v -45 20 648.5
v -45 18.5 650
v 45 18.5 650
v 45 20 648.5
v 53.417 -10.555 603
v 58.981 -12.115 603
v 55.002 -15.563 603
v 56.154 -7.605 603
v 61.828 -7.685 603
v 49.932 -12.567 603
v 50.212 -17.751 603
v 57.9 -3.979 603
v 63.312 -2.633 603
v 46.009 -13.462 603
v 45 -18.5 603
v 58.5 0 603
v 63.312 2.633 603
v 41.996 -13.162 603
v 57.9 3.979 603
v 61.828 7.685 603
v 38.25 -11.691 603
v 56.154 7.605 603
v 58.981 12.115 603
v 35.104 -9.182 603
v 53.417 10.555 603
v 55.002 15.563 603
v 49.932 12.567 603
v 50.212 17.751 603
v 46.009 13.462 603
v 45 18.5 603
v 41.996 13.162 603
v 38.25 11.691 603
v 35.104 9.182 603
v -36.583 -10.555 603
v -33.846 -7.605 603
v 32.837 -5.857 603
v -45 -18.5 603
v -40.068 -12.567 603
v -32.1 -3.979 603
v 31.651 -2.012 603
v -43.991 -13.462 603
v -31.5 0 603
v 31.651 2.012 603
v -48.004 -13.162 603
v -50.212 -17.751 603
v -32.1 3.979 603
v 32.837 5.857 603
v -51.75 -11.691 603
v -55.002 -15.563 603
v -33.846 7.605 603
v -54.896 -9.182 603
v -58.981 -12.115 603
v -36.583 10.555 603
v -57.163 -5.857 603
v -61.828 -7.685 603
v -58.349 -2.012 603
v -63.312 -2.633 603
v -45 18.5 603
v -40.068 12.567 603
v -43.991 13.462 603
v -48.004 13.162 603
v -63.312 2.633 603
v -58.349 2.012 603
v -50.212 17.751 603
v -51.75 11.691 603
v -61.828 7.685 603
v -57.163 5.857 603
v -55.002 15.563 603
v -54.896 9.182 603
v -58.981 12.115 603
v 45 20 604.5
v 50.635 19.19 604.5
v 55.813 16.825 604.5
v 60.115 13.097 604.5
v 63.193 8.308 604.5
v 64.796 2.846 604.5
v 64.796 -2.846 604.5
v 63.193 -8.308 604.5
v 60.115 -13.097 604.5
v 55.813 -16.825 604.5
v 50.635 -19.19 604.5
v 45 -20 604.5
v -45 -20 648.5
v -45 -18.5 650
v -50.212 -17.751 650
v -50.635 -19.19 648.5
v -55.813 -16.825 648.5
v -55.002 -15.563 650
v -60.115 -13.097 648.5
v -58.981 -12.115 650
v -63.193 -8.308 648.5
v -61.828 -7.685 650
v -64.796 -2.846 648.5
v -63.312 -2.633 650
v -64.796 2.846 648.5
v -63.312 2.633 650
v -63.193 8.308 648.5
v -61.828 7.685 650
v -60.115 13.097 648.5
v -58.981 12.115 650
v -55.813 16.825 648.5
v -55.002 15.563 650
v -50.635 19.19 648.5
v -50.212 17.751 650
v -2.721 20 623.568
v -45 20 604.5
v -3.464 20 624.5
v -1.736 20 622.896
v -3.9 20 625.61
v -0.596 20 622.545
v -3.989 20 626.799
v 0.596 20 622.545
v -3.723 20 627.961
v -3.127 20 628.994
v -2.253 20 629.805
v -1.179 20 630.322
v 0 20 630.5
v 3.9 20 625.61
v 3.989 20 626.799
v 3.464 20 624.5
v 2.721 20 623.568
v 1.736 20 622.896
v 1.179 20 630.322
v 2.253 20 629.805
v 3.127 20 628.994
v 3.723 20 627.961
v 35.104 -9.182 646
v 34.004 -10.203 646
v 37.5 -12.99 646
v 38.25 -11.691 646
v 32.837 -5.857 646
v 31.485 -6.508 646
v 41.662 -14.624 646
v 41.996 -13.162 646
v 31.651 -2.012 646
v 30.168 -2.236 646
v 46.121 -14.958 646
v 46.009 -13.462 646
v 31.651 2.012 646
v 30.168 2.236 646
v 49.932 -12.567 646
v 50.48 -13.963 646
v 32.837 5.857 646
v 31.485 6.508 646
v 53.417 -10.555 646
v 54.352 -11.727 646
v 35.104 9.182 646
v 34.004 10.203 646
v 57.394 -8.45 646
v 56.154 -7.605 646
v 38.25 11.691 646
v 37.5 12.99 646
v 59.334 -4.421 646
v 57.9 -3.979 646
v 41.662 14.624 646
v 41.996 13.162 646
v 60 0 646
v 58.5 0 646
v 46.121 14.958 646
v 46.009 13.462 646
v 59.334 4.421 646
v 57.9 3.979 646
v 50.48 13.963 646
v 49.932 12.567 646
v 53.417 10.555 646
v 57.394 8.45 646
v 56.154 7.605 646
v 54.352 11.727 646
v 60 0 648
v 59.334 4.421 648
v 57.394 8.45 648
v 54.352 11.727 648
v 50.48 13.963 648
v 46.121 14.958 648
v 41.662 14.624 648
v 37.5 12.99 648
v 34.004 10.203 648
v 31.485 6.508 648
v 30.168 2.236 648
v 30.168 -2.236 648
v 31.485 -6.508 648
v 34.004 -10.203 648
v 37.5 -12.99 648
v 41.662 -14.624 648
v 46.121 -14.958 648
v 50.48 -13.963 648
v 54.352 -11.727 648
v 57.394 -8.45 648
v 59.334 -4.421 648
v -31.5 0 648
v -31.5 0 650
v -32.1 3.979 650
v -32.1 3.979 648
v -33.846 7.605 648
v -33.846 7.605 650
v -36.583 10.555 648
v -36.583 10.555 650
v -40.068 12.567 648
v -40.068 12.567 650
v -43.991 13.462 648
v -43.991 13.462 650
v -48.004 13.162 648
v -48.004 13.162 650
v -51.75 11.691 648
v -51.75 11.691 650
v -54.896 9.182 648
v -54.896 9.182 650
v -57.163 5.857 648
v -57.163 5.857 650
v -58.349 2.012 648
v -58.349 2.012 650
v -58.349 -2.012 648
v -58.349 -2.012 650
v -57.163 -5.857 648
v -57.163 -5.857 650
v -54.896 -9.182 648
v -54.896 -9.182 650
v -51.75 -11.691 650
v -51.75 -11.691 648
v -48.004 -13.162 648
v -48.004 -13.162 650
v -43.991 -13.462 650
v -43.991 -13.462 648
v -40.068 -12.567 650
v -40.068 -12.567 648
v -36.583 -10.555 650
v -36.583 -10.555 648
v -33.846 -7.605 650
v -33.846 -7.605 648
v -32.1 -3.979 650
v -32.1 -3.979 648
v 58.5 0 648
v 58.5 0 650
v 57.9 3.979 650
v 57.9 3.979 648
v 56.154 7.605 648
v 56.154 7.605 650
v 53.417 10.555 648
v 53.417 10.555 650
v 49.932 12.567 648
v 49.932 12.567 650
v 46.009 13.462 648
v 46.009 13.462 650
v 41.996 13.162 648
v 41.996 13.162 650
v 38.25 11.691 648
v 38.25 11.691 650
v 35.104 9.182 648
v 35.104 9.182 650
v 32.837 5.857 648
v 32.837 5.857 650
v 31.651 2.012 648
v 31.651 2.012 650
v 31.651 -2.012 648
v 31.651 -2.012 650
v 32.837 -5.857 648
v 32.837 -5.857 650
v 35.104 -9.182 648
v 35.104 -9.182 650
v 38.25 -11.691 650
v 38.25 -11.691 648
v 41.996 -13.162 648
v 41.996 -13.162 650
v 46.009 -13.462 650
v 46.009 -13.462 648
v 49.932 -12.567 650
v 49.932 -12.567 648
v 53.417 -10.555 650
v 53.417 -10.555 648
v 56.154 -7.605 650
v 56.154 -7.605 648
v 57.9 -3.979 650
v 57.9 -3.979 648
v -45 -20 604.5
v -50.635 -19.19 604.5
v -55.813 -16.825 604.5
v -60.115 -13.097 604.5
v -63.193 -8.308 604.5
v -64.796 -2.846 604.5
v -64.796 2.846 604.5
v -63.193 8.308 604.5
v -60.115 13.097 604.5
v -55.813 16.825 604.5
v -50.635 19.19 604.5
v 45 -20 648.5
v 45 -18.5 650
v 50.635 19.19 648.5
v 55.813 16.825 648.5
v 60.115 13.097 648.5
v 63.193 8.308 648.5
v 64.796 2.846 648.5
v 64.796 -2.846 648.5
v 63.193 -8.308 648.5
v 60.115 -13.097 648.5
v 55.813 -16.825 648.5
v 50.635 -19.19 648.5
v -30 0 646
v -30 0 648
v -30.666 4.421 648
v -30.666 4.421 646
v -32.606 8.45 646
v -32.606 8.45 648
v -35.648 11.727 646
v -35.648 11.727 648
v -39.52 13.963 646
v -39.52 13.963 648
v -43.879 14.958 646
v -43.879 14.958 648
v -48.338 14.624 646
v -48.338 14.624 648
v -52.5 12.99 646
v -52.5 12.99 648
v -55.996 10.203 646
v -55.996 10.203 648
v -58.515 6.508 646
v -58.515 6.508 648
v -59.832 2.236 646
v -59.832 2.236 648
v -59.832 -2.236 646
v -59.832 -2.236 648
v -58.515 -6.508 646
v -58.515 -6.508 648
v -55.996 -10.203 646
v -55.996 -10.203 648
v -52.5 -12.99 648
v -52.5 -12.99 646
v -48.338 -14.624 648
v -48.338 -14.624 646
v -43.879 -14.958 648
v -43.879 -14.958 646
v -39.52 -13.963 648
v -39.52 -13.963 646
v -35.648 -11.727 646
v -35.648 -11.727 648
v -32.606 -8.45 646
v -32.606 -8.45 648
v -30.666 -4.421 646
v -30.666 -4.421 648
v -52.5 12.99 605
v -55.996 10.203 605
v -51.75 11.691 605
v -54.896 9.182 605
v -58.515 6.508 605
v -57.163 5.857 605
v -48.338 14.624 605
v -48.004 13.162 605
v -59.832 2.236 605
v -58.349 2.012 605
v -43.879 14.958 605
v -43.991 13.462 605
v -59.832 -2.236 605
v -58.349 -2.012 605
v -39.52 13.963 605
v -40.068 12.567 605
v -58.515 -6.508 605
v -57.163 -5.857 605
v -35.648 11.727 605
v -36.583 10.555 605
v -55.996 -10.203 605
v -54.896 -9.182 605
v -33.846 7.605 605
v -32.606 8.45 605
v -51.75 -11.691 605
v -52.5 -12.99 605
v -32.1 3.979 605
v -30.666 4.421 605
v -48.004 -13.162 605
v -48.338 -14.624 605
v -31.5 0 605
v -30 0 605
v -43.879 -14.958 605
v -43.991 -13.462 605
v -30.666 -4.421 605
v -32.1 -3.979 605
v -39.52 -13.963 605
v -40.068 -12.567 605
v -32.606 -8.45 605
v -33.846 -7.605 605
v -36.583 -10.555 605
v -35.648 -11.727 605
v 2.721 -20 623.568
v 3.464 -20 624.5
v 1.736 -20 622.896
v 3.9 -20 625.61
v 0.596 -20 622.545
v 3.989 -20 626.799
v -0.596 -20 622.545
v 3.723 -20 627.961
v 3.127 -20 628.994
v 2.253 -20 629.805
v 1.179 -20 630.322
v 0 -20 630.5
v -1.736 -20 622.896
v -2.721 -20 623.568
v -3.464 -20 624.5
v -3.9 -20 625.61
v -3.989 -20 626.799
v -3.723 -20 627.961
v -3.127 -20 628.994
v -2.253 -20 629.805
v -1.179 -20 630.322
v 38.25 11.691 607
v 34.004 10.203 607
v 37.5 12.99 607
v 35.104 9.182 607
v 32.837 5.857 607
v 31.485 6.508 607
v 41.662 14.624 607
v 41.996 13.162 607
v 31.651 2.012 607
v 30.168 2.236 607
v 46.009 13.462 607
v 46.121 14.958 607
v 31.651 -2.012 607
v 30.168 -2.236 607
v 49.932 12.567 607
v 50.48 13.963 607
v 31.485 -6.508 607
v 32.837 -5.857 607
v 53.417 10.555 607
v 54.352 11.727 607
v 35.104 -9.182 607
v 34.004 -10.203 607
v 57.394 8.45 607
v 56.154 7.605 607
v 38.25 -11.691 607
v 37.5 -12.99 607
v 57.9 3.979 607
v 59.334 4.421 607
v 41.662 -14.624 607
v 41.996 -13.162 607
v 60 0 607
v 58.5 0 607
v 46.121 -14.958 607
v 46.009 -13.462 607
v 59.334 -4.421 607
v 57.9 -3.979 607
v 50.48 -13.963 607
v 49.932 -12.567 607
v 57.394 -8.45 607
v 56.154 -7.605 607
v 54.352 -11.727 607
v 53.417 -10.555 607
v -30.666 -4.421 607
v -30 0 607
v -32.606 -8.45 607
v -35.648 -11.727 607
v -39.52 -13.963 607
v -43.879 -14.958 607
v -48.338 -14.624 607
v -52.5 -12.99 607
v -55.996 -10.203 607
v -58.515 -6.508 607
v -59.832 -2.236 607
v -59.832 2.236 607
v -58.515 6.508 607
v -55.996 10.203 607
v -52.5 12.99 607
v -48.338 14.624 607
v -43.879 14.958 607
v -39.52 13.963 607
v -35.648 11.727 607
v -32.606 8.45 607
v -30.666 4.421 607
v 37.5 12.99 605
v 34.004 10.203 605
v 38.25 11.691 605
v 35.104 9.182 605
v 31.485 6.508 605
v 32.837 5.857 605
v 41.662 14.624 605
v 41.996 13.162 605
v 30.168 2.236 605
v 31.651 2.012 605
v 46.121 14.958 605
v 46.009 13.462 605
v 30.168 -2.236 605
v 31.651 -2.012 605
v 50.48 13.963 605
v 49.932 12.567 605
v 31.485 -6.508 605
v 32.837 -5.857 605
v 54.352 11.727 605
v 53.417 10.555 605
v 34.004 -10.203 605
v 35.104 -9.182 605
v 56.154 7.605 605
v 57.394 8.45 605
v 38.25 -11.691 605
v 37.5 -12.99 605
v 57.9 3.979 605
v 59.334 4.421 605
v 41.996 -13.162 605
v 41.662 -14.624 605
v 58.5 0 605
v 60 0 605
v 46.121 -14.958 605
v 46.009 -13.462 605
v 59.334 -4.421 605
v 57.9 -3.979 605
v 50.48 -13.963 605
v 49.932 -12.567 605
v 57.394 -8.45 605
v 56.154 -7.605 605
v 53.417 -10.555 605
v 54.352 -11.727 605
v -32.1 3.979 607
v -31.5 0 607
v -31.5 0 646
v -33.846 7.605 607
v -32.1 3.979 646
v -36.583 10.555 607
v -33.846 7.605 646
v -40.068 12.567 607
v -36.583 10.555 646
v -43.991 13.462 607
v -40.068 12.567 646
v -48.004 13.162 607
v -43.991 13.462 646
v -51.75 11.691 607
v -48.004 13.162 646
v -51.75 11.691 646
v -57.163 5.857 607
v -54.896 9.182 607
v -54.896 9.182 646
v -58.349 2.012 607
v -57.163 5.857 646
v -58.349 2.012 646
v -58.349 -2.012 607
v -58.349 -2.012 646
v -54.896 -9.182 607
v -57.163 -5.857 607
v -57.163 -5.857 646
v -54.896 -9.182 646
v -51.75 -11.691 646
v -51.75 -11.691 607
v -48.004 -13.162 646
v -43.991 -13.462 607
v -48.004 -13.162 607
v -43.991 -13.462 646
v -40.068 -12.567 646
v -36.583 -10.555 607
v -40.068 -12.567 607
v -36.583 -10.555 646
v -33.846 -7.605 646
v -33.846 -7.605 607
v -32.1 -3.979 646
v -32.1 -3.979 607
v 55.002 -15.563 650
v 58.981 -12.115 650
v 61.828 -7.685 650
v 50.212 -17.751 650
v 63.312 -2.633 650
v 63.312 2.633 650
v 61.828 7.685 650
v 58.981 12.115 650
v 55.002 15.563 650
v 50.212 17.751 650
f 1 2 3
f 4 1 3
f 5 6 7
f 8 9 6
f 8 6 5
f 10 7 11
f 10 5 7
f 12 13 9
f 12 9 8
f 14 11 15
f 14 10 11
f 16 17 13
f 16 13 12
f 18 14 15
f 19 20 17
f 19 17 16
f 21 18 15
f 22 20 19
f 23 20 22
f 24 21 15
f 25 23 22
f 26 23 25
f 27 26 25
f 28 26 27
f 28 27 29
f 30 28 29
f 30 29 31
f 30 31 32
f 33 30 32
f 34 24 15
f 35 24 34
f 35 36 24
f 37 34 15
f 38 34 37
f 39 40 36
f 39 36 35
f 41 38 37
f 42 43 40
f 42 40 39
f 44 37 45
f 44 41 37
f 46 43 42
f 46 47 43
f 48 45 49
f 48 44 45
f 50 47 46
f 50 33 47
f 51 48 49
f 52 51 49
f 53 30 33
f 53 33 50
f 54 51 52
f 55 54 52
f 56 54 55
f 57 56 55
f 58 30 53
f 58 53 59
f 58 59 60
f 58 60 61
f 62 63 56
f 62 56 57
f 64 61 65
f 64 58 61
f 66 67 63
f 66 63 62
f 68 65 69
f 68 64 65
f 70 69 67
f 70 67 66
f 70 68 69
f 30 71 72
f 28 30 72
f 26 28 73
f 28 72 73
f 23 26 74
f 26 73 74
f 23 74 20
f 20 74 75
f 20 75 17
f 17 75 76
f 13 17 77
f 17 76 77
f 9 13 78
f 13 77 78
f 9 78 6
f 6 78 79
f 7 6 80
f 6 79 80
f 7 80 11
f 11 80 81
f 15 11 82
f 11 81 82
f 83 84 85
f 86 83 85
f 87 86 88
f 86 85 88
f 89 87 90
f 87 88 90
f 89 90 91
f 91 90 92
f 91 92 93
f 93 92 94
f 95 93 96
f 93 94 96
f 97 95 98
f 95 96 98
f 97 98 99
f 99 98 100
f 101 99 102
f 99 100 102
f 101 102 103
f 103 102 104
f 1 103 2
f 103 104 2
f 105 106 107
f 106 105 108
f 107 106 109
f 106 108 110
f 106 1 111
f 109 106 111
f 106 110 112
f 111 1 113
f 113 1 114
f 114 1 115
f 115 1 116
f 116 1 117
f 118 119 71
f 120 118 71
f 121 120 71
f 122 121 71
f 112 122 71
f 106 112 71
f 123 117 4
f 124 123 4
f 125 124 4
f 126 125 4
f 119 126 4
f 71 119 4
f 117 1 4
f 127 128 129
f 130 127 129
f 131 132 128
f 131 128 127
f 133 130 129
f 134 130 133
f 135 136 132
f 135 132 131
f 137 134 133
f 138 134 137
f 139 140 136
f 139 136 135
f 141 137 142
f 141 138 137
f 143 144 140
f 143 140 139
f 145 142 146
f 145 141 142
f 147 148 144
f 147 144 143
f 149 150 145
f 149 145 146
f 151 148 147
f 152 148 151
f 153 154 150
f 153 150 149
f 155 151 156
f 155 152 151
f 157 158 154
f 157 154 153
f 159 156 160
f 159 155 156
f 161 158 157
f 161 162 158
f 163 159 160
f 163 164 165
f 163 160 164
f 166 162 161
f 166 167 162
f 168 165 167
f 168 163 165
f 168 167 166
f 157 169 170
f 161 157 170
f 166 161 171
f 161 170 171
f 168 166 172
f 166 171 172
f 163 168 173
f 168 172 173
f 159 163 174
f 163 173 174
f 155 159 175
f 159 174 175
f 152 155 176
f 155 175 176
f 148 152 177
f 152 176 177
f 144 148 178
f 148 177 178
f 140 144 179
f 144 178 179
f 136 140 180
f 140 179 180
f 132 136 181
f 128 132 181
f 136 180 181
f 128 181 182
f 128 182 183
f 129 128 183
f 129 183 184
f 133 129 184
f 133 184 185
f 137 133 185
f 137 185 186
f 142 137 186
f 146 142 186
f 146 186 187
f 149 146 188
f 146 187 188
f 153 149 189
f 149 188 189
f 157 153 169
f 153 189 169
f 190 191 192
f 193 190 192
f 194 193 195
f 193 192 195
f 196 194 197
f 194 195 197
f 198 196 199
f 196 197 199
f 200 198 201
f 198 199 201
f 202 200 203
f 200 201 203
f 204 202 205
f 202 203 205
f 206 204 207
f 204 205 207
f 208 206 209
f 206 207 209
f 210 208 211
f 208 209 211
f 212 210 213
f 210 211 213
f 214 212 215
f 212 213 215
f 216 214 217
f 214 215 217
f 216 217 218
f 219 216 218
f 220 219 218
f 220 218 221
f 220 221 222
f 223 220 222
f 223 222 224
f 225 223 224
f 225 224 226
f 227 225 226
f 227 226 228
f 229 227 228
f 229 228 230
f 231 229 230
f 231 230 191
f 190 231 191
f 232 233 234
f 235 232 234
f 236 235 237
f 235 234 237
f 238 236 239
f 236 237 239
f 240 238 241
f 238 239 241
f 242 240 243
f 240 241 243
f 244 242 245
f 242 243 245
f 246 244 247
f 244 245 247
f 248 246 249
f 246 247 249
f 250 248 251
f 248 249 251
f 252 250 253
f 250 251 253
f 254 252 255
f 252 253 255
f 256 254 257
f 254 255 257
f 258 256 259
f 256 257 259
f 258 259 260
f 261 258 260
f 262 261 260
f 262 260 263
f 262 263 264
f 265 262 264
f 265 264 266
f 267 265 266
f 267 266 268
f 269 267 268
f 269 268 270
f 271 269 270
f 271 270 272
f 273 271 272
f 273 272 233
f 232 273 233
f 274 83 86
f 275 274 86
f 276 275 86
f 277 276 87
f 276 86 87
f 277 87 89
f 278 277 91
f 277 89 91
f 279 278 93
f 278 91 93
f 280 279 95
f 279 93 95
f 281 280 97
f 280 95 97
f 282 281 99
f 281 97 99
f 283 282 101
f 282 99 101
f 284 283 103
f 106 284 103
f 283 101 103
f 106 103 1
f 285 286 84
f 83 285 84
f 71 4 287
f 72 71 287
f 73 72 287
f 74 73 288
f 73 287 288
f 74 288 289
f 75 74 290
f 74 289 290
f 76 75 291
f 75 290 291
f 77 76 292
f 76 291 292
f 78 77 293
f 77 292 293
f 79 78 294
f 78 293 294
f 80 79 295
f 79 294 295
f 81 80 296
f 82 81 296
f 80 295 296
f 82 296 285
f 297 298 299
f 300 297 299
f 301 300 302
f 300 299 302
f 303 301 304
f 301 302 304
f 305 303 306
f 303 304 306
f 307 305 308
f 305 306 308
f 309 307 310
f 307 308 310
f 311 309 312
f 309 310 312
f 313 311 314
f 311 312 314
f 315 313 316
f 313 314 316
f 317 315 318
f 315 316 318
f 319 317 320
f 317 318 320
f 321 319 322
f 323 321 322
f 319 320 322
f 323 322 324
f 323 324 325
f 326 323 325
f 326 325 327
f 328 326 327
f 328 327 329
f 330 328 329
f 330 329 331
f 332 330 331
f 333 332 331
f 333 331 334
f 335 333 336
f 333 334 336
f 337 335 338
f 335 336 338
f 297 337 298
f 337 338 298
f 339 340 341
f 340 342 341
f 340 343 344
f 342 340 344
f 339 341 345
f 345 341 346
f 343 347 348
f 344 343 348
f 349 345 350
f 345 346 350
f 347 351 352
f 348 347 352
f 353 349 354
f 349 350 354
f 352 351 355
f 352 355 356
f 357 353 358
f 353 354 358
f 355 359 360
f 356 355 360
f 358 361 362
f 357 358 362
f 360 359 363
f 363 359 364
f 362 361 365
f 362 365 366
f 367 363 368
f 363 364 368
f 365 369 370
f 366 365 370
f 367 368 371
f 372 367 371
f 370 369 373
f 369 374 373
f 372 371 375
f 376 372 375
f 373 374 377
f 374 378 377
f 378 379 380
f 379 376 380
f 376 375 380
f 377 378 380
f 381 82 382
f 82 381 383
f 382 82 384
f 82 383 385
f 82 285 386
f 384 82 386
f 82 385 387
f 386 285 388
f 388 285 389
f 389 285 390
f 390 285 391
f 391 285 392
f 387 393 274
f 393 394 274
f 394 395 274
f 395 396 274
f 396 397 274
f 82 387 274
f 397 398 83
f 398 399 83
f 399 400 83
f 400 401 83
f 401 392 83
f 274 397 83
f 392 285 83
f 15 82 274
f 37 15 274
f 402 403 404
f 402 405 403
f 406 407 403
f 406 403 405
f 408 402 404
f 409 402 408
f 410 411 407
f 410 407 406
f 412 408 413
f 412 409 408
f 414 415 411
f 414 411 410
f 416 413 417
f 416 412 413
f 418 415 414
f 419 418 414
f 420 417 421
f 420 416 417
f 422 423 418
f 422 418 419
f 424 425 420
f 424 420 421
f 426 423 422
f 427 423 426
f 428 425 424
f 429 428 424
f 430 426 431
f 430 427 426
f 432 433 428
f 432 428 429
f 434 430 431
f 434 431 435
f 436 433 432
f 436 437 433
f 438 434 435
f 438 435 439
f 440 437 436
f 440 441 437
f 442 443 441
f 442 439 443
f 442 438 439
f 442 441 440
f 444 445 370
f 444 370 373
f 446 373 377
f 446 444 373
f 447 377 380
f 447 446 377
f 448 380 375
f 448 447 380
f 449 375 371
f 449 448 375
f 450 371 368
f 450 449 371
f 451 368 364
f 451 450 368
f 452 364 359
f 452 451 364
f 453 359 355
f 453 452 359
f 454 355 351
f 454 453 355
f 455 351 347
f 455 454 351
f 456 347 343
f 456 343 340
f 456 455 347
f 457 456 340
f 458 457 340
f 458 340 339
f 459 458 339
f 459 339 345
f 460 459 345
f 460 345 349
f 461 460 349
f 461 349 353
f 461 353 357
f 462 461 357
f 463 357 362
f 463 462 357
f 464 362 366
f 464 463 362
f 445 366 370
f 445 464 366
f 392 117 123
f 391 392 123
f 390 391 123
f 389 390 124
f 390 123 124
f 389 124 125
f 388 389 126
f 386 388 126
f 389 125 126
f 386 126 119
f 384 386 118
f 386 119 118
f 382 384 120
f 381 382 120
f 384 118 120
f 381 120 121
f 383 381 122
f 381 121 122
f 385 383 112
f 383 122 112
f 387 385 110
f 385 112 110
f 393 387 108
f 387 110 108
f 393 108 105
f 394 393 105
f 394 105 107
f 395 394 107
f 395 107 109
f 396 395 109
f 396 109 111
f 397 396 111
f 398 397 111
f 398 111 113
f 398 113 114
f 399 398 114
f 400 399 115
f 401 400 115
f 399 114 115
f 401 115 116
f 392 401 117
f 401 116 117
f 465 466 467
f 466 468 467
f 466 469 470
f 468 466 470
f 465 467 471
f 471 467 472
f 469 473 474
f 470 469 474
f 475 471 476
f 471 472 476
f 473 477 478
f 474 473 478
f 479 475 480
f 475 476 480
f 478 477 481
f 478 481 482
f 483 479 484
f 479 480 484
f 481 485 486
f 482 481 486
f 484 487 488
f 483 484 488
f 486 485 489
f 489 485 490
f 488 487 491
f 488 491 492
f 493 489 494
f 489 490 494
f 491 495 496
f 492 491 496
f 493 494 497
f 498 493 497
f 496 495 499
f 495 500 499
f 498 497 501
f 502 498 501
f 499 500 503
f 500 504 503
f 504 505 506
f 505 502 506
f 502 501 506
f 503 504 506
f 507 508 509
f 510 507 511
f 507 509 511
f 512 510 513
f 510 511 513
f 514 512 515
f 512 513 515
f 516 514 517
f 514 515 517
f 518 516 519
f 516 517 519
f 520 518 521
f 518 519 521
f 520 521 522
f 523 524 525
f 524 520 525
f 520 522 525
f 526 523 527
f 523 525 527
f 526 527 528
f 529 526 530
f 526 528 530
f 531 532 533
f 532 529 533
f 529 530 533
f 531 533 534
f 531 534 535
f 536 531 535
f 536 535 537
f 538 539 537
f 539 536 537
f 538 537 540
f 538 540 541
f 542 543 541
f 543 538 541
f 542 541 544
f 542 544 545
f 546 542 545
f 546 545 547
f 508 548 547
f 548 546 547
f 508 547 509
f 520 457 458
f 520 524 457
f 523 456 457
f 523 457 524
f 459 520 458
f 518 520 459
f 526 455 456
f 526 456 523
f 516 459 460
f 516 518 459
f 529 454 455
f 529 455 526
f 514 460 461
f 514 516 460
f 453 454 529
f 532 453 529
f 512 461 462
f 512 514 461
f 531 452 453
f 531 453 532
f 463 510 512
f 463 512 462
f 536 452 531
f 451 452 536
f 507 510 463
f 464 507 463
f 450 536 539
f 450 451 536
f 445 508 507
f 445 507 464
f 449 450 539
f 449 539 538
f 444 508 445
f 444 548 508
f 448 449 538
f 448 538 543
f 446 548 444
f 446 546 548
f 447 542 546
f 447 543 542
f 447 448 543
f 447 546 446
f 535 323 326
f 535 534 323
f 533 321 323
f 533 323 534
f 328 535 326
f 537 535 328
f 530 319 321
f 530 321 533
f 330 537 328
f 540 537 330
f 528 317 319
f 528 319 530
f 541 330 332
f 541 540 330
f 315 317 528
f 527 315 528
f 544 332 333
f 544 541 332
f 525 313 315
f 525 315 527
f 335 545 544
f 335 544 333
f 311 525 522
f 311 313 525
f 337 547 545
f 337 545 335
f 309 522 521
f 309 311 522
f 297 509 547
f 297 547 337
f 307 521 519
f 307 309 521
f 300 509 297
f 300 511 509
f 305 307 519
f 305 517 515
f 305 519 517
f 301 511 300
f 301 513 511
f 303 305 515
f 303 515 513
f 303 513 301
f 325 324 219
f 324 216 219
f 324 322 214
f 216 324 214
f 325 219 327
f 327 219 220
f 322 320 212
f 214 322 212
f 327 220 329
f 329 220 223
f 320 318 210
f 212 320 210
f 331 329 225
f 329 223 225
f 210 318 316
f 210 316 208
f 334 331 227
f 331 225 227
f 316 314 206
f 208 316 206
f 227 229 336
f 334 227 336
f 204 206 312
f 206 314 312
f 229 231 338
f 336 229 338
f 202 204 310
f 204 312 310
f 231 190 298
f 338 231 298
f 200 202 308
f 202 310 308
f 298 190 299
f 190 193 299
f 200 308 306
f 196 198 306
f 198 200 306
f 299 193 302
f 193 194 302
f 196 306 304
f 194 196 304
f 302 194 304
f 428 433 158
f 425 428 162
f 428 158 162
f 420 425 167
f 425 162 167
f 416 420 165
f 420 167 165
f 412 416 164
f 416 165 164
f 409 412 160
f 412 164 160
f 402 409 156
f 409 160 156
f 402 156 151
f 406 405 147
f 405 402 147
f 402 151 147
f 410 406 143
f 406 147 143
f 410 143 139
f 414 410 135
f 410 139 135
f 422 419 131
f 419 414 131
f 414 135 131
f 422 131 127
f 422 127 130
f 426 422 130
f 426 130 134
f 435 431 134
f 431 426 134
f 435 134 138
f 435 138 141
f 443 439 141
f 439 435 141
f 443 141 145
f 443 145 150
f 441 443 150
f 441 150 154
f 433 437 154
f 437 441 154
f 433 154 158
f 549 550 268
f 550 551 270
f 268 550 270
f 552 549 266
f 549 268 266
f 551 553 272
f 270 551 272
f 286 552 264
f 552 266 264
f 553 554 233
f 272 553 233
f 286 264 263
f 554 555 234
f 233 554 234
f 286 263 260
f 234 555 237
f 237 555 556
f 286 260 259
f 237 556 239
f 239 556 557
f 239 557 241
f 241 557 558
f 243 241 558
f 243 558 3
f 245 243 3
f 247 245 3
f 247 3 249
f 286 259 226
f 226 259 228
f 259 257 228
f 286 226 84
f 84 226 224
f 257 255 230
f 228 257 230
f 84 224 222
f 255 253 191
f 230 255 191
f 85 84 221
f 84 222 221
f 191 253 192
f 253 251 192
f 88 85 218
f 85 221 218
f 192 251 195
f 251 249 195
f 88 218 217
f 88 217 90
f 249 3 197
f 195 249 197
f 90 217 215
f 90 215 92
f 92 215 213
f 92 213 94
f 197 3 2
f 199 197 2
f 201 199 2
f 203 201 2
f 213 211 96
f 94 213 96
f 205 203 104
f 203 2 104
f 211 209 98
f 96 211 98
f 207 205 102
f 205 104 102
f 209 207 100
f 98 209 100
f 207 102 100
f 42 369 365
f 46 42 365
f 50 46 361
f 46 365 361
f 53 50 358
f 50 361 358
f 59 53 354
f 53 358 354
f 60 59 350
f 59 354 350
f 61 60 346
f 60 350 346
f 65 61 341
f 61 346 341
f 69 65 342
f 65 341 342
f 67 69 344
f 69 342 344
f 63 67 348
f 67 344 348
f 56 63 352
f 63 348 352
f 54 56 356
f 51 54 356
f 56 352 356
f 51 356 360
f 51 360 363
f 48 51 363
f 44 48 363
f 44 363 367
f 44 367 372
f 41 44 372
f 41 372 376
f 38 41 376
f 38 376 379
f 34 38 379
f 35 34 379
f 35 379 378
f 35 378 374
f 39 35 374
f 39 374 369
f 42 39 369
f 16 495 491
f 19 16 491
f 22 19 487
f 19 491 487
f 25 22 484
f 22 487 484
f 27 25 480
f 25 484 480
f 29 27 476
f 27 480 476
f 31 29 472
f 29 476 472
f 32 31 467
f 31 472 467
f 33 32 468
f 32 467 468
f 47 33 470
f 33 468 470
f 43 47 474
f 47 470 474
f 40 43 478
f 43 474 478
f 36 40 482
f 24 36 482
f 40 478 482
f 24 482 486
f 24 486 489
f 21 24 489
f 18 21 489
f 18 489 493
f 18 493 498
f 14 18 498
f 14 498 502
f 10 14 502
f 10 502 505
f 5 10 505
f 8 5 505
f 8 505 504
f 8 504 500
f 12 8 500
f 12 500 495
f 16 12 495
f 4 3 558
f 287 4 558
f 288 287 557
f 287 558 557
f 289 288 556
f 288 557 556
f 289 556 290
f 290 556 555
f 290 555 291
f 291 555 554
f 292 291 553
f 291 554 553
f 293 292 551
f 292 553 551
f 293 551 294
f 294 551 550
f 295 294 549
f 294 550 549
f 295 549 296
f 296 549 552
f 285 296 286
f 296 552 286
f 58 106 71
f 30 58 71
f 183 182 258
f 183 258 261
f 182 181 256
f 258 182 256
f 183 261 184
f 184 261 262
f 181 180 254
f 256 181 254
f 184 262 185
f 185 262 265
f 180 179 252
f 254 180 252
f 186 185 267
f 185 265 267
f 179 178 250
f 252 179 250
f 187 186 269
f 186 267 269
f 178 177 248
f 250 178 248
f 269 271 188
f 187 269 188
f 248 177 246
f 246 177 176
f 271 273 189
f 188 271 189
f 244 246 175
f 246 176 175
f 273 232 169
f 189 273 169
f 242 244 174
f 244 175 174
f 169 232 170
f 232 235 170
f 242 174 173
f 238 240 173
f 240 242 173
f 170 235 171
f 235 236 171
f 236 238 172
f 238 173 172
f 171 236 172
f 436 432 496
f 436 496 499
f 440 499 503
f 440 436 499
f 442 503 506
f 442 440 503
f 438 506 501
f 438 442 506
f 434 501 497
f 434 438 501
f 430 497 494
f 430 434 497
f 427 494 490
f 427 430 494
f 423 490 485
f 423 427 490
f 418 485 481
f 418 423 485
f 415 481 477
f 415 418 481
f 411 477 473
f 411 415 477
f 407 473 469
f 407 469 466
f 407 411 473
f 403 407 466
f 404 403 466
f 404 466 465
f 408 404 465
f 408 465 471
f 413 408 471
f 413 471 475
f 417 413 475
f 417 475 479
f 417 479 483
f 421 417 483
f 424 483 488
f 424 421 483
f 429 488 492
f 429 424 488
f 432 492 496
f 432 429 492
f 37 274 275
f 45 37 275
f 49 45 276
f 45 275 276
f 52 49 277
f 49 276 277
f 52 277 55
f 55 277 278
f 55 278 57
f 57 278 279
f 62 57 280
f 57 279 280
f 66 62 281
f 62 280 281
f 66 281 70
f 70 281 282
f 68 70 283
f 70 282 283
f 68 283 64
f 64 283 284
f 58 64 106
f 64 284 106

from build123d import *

# Parameters (mm, degrees)
BOSS_EXTRUDE1_START = 650
SKETCH1_R           = 13.5
BOSS_EXTRUDE1_DEPTH = 47
CUT_EXTRUDE2_START  = -2
SKETCH4_R           = 15
SKETCH4_R_2         = 13.5
CUT_EXTRUDE2_DEPTH  = 2
SKETCH5_R           = 4
CUT_EXTRUDE3_DEPTH  = 40
CUT_EXTRUDE4_START  = -4
SKETCH6_R           = 15
SKETCH6_R_2         = 13.5
CUT_EXTRUDE4_DEPTH  = 2
CHAMFER1_SIZE       = 1.5


with BuildPart() as part:
    # Sketch1 → Boss-Extrude1 (new body)
    with BuildSketch(Plane.XY.offset(BOSS_EXTRUDE1_START)):
        with BuildLine():
            Line((-45, 20), (45, 20))
            ThreePointArc((45, 20), (65, 0), (45, -20))
            Line((45, -20), (-45, -20))
            ThreePointArc((-45, -20), (-65, 0), (-45, 20))
        make_face()
        with Locations((-45, 0)):
            Circle(SKETCH1_R, mode=Mode.SUBTRACT)
        with Locations((45, 0)):
            Circle(SKETCH1_R, mode=Mode.SUBTRACT)
    extrude(amount=-BOSS_EXTRUDE1_DEPTH)

    # Sketch4 → Cut-Extrude2 (cut)
    # profile 1 of 2: a face of its own
    with BuildSketch(Plane.XY.offset(650).offset(CUT_EXTRUDE2_START)):
        with Locations((-45, 0)):
            Circle(SKETCH4_R)
        with Locations((-45, 0)):
            Circle(SKETCH4_R_2, mode=Mode.SUBTRACT)
    # profile 2 of 2: a face of its own
    with BuildSketch(Plane.XY.offset(650).offset(CUT_EXTRUDE2_START)):
        with Locations((45, 0)):
            Circle(SKETCH4_R)
        with Locations((45, 0)):
            Circle(SKETCH4_R_2, mode=Mode.SUBTRACT)
    extrude(amount=-CUT_EXTRUDE2_DEPTH, mode=Mode.SUBTRACT)

    # Sketch5 → Cut-Extrude3 (cut)
    with BuildSketch(Plane(origin=(0, 20, 0), x_dir=(1, 0, 0), z_dir=(0, 1, 0))):
        with Locations(Location((0, -626.5, 0), (0, 0, 270))):
            Circle(SKETCH5_R)
    extrude(amount=-CUT_EXTRUDE3_DEPTH, mode=Mode.SUBTRACT)

    # Sketch6 → Cut-Extrude4 (cut)
    # profile 1 of 2: a face of its own
    with BuildSketch(Plane(origin=(0, 0, 603), x_dir=(-1, 0, 0), z_dir=(0, 0, -1)).offset(CUT_EXTRUDE4_START)):
        with Locations(Location((-45, 0, 0), (0, 0, 180))):
            Circle(SKETCH6_R)
        with Locations(Location((-45, 0, 0), (0, 0, 180))):
            Circle(SKETCH6_R_2, mode=Mode.SUBTRACT)
    # profile 2 of 2: a face of its own
    with BuildSketch(Plane(origin=(0, 0, 603), x_dir=(-1, 0, 0), z_dir=(0, 0, -1)).offset(CUT_EXTRUDE4_START)):
        with Locations(Location((45, 0, 0), (0, 0, 180))):
            Circle(SKETCH6_R)
        with Locations(Location((45, 0, 0), (0, 0, 180))):
            Circle(SKETCH6_R_2, mode=Mode.SUBTRACT)
    extrude(amount=CUT_EXTRUDE4_DEPTH, mode=Mode.SUBTRACT)

    # Chamfer1
    chamfer1_edges = [part.edges().sort_by_distance(p)[0] for p in [
        (65, 0, 603),
        (0, 20, 603),
        (-65, 0, 603),
        (0, 20, 650),
        (65, 0, 650),
        (0, -20, 650),
        (-65, 0, 650),
        (0, -20, 603),
    ]]
    chamfer(chamfer1_edges, length=CHAMFER1_SIZE)


solid = part.part
